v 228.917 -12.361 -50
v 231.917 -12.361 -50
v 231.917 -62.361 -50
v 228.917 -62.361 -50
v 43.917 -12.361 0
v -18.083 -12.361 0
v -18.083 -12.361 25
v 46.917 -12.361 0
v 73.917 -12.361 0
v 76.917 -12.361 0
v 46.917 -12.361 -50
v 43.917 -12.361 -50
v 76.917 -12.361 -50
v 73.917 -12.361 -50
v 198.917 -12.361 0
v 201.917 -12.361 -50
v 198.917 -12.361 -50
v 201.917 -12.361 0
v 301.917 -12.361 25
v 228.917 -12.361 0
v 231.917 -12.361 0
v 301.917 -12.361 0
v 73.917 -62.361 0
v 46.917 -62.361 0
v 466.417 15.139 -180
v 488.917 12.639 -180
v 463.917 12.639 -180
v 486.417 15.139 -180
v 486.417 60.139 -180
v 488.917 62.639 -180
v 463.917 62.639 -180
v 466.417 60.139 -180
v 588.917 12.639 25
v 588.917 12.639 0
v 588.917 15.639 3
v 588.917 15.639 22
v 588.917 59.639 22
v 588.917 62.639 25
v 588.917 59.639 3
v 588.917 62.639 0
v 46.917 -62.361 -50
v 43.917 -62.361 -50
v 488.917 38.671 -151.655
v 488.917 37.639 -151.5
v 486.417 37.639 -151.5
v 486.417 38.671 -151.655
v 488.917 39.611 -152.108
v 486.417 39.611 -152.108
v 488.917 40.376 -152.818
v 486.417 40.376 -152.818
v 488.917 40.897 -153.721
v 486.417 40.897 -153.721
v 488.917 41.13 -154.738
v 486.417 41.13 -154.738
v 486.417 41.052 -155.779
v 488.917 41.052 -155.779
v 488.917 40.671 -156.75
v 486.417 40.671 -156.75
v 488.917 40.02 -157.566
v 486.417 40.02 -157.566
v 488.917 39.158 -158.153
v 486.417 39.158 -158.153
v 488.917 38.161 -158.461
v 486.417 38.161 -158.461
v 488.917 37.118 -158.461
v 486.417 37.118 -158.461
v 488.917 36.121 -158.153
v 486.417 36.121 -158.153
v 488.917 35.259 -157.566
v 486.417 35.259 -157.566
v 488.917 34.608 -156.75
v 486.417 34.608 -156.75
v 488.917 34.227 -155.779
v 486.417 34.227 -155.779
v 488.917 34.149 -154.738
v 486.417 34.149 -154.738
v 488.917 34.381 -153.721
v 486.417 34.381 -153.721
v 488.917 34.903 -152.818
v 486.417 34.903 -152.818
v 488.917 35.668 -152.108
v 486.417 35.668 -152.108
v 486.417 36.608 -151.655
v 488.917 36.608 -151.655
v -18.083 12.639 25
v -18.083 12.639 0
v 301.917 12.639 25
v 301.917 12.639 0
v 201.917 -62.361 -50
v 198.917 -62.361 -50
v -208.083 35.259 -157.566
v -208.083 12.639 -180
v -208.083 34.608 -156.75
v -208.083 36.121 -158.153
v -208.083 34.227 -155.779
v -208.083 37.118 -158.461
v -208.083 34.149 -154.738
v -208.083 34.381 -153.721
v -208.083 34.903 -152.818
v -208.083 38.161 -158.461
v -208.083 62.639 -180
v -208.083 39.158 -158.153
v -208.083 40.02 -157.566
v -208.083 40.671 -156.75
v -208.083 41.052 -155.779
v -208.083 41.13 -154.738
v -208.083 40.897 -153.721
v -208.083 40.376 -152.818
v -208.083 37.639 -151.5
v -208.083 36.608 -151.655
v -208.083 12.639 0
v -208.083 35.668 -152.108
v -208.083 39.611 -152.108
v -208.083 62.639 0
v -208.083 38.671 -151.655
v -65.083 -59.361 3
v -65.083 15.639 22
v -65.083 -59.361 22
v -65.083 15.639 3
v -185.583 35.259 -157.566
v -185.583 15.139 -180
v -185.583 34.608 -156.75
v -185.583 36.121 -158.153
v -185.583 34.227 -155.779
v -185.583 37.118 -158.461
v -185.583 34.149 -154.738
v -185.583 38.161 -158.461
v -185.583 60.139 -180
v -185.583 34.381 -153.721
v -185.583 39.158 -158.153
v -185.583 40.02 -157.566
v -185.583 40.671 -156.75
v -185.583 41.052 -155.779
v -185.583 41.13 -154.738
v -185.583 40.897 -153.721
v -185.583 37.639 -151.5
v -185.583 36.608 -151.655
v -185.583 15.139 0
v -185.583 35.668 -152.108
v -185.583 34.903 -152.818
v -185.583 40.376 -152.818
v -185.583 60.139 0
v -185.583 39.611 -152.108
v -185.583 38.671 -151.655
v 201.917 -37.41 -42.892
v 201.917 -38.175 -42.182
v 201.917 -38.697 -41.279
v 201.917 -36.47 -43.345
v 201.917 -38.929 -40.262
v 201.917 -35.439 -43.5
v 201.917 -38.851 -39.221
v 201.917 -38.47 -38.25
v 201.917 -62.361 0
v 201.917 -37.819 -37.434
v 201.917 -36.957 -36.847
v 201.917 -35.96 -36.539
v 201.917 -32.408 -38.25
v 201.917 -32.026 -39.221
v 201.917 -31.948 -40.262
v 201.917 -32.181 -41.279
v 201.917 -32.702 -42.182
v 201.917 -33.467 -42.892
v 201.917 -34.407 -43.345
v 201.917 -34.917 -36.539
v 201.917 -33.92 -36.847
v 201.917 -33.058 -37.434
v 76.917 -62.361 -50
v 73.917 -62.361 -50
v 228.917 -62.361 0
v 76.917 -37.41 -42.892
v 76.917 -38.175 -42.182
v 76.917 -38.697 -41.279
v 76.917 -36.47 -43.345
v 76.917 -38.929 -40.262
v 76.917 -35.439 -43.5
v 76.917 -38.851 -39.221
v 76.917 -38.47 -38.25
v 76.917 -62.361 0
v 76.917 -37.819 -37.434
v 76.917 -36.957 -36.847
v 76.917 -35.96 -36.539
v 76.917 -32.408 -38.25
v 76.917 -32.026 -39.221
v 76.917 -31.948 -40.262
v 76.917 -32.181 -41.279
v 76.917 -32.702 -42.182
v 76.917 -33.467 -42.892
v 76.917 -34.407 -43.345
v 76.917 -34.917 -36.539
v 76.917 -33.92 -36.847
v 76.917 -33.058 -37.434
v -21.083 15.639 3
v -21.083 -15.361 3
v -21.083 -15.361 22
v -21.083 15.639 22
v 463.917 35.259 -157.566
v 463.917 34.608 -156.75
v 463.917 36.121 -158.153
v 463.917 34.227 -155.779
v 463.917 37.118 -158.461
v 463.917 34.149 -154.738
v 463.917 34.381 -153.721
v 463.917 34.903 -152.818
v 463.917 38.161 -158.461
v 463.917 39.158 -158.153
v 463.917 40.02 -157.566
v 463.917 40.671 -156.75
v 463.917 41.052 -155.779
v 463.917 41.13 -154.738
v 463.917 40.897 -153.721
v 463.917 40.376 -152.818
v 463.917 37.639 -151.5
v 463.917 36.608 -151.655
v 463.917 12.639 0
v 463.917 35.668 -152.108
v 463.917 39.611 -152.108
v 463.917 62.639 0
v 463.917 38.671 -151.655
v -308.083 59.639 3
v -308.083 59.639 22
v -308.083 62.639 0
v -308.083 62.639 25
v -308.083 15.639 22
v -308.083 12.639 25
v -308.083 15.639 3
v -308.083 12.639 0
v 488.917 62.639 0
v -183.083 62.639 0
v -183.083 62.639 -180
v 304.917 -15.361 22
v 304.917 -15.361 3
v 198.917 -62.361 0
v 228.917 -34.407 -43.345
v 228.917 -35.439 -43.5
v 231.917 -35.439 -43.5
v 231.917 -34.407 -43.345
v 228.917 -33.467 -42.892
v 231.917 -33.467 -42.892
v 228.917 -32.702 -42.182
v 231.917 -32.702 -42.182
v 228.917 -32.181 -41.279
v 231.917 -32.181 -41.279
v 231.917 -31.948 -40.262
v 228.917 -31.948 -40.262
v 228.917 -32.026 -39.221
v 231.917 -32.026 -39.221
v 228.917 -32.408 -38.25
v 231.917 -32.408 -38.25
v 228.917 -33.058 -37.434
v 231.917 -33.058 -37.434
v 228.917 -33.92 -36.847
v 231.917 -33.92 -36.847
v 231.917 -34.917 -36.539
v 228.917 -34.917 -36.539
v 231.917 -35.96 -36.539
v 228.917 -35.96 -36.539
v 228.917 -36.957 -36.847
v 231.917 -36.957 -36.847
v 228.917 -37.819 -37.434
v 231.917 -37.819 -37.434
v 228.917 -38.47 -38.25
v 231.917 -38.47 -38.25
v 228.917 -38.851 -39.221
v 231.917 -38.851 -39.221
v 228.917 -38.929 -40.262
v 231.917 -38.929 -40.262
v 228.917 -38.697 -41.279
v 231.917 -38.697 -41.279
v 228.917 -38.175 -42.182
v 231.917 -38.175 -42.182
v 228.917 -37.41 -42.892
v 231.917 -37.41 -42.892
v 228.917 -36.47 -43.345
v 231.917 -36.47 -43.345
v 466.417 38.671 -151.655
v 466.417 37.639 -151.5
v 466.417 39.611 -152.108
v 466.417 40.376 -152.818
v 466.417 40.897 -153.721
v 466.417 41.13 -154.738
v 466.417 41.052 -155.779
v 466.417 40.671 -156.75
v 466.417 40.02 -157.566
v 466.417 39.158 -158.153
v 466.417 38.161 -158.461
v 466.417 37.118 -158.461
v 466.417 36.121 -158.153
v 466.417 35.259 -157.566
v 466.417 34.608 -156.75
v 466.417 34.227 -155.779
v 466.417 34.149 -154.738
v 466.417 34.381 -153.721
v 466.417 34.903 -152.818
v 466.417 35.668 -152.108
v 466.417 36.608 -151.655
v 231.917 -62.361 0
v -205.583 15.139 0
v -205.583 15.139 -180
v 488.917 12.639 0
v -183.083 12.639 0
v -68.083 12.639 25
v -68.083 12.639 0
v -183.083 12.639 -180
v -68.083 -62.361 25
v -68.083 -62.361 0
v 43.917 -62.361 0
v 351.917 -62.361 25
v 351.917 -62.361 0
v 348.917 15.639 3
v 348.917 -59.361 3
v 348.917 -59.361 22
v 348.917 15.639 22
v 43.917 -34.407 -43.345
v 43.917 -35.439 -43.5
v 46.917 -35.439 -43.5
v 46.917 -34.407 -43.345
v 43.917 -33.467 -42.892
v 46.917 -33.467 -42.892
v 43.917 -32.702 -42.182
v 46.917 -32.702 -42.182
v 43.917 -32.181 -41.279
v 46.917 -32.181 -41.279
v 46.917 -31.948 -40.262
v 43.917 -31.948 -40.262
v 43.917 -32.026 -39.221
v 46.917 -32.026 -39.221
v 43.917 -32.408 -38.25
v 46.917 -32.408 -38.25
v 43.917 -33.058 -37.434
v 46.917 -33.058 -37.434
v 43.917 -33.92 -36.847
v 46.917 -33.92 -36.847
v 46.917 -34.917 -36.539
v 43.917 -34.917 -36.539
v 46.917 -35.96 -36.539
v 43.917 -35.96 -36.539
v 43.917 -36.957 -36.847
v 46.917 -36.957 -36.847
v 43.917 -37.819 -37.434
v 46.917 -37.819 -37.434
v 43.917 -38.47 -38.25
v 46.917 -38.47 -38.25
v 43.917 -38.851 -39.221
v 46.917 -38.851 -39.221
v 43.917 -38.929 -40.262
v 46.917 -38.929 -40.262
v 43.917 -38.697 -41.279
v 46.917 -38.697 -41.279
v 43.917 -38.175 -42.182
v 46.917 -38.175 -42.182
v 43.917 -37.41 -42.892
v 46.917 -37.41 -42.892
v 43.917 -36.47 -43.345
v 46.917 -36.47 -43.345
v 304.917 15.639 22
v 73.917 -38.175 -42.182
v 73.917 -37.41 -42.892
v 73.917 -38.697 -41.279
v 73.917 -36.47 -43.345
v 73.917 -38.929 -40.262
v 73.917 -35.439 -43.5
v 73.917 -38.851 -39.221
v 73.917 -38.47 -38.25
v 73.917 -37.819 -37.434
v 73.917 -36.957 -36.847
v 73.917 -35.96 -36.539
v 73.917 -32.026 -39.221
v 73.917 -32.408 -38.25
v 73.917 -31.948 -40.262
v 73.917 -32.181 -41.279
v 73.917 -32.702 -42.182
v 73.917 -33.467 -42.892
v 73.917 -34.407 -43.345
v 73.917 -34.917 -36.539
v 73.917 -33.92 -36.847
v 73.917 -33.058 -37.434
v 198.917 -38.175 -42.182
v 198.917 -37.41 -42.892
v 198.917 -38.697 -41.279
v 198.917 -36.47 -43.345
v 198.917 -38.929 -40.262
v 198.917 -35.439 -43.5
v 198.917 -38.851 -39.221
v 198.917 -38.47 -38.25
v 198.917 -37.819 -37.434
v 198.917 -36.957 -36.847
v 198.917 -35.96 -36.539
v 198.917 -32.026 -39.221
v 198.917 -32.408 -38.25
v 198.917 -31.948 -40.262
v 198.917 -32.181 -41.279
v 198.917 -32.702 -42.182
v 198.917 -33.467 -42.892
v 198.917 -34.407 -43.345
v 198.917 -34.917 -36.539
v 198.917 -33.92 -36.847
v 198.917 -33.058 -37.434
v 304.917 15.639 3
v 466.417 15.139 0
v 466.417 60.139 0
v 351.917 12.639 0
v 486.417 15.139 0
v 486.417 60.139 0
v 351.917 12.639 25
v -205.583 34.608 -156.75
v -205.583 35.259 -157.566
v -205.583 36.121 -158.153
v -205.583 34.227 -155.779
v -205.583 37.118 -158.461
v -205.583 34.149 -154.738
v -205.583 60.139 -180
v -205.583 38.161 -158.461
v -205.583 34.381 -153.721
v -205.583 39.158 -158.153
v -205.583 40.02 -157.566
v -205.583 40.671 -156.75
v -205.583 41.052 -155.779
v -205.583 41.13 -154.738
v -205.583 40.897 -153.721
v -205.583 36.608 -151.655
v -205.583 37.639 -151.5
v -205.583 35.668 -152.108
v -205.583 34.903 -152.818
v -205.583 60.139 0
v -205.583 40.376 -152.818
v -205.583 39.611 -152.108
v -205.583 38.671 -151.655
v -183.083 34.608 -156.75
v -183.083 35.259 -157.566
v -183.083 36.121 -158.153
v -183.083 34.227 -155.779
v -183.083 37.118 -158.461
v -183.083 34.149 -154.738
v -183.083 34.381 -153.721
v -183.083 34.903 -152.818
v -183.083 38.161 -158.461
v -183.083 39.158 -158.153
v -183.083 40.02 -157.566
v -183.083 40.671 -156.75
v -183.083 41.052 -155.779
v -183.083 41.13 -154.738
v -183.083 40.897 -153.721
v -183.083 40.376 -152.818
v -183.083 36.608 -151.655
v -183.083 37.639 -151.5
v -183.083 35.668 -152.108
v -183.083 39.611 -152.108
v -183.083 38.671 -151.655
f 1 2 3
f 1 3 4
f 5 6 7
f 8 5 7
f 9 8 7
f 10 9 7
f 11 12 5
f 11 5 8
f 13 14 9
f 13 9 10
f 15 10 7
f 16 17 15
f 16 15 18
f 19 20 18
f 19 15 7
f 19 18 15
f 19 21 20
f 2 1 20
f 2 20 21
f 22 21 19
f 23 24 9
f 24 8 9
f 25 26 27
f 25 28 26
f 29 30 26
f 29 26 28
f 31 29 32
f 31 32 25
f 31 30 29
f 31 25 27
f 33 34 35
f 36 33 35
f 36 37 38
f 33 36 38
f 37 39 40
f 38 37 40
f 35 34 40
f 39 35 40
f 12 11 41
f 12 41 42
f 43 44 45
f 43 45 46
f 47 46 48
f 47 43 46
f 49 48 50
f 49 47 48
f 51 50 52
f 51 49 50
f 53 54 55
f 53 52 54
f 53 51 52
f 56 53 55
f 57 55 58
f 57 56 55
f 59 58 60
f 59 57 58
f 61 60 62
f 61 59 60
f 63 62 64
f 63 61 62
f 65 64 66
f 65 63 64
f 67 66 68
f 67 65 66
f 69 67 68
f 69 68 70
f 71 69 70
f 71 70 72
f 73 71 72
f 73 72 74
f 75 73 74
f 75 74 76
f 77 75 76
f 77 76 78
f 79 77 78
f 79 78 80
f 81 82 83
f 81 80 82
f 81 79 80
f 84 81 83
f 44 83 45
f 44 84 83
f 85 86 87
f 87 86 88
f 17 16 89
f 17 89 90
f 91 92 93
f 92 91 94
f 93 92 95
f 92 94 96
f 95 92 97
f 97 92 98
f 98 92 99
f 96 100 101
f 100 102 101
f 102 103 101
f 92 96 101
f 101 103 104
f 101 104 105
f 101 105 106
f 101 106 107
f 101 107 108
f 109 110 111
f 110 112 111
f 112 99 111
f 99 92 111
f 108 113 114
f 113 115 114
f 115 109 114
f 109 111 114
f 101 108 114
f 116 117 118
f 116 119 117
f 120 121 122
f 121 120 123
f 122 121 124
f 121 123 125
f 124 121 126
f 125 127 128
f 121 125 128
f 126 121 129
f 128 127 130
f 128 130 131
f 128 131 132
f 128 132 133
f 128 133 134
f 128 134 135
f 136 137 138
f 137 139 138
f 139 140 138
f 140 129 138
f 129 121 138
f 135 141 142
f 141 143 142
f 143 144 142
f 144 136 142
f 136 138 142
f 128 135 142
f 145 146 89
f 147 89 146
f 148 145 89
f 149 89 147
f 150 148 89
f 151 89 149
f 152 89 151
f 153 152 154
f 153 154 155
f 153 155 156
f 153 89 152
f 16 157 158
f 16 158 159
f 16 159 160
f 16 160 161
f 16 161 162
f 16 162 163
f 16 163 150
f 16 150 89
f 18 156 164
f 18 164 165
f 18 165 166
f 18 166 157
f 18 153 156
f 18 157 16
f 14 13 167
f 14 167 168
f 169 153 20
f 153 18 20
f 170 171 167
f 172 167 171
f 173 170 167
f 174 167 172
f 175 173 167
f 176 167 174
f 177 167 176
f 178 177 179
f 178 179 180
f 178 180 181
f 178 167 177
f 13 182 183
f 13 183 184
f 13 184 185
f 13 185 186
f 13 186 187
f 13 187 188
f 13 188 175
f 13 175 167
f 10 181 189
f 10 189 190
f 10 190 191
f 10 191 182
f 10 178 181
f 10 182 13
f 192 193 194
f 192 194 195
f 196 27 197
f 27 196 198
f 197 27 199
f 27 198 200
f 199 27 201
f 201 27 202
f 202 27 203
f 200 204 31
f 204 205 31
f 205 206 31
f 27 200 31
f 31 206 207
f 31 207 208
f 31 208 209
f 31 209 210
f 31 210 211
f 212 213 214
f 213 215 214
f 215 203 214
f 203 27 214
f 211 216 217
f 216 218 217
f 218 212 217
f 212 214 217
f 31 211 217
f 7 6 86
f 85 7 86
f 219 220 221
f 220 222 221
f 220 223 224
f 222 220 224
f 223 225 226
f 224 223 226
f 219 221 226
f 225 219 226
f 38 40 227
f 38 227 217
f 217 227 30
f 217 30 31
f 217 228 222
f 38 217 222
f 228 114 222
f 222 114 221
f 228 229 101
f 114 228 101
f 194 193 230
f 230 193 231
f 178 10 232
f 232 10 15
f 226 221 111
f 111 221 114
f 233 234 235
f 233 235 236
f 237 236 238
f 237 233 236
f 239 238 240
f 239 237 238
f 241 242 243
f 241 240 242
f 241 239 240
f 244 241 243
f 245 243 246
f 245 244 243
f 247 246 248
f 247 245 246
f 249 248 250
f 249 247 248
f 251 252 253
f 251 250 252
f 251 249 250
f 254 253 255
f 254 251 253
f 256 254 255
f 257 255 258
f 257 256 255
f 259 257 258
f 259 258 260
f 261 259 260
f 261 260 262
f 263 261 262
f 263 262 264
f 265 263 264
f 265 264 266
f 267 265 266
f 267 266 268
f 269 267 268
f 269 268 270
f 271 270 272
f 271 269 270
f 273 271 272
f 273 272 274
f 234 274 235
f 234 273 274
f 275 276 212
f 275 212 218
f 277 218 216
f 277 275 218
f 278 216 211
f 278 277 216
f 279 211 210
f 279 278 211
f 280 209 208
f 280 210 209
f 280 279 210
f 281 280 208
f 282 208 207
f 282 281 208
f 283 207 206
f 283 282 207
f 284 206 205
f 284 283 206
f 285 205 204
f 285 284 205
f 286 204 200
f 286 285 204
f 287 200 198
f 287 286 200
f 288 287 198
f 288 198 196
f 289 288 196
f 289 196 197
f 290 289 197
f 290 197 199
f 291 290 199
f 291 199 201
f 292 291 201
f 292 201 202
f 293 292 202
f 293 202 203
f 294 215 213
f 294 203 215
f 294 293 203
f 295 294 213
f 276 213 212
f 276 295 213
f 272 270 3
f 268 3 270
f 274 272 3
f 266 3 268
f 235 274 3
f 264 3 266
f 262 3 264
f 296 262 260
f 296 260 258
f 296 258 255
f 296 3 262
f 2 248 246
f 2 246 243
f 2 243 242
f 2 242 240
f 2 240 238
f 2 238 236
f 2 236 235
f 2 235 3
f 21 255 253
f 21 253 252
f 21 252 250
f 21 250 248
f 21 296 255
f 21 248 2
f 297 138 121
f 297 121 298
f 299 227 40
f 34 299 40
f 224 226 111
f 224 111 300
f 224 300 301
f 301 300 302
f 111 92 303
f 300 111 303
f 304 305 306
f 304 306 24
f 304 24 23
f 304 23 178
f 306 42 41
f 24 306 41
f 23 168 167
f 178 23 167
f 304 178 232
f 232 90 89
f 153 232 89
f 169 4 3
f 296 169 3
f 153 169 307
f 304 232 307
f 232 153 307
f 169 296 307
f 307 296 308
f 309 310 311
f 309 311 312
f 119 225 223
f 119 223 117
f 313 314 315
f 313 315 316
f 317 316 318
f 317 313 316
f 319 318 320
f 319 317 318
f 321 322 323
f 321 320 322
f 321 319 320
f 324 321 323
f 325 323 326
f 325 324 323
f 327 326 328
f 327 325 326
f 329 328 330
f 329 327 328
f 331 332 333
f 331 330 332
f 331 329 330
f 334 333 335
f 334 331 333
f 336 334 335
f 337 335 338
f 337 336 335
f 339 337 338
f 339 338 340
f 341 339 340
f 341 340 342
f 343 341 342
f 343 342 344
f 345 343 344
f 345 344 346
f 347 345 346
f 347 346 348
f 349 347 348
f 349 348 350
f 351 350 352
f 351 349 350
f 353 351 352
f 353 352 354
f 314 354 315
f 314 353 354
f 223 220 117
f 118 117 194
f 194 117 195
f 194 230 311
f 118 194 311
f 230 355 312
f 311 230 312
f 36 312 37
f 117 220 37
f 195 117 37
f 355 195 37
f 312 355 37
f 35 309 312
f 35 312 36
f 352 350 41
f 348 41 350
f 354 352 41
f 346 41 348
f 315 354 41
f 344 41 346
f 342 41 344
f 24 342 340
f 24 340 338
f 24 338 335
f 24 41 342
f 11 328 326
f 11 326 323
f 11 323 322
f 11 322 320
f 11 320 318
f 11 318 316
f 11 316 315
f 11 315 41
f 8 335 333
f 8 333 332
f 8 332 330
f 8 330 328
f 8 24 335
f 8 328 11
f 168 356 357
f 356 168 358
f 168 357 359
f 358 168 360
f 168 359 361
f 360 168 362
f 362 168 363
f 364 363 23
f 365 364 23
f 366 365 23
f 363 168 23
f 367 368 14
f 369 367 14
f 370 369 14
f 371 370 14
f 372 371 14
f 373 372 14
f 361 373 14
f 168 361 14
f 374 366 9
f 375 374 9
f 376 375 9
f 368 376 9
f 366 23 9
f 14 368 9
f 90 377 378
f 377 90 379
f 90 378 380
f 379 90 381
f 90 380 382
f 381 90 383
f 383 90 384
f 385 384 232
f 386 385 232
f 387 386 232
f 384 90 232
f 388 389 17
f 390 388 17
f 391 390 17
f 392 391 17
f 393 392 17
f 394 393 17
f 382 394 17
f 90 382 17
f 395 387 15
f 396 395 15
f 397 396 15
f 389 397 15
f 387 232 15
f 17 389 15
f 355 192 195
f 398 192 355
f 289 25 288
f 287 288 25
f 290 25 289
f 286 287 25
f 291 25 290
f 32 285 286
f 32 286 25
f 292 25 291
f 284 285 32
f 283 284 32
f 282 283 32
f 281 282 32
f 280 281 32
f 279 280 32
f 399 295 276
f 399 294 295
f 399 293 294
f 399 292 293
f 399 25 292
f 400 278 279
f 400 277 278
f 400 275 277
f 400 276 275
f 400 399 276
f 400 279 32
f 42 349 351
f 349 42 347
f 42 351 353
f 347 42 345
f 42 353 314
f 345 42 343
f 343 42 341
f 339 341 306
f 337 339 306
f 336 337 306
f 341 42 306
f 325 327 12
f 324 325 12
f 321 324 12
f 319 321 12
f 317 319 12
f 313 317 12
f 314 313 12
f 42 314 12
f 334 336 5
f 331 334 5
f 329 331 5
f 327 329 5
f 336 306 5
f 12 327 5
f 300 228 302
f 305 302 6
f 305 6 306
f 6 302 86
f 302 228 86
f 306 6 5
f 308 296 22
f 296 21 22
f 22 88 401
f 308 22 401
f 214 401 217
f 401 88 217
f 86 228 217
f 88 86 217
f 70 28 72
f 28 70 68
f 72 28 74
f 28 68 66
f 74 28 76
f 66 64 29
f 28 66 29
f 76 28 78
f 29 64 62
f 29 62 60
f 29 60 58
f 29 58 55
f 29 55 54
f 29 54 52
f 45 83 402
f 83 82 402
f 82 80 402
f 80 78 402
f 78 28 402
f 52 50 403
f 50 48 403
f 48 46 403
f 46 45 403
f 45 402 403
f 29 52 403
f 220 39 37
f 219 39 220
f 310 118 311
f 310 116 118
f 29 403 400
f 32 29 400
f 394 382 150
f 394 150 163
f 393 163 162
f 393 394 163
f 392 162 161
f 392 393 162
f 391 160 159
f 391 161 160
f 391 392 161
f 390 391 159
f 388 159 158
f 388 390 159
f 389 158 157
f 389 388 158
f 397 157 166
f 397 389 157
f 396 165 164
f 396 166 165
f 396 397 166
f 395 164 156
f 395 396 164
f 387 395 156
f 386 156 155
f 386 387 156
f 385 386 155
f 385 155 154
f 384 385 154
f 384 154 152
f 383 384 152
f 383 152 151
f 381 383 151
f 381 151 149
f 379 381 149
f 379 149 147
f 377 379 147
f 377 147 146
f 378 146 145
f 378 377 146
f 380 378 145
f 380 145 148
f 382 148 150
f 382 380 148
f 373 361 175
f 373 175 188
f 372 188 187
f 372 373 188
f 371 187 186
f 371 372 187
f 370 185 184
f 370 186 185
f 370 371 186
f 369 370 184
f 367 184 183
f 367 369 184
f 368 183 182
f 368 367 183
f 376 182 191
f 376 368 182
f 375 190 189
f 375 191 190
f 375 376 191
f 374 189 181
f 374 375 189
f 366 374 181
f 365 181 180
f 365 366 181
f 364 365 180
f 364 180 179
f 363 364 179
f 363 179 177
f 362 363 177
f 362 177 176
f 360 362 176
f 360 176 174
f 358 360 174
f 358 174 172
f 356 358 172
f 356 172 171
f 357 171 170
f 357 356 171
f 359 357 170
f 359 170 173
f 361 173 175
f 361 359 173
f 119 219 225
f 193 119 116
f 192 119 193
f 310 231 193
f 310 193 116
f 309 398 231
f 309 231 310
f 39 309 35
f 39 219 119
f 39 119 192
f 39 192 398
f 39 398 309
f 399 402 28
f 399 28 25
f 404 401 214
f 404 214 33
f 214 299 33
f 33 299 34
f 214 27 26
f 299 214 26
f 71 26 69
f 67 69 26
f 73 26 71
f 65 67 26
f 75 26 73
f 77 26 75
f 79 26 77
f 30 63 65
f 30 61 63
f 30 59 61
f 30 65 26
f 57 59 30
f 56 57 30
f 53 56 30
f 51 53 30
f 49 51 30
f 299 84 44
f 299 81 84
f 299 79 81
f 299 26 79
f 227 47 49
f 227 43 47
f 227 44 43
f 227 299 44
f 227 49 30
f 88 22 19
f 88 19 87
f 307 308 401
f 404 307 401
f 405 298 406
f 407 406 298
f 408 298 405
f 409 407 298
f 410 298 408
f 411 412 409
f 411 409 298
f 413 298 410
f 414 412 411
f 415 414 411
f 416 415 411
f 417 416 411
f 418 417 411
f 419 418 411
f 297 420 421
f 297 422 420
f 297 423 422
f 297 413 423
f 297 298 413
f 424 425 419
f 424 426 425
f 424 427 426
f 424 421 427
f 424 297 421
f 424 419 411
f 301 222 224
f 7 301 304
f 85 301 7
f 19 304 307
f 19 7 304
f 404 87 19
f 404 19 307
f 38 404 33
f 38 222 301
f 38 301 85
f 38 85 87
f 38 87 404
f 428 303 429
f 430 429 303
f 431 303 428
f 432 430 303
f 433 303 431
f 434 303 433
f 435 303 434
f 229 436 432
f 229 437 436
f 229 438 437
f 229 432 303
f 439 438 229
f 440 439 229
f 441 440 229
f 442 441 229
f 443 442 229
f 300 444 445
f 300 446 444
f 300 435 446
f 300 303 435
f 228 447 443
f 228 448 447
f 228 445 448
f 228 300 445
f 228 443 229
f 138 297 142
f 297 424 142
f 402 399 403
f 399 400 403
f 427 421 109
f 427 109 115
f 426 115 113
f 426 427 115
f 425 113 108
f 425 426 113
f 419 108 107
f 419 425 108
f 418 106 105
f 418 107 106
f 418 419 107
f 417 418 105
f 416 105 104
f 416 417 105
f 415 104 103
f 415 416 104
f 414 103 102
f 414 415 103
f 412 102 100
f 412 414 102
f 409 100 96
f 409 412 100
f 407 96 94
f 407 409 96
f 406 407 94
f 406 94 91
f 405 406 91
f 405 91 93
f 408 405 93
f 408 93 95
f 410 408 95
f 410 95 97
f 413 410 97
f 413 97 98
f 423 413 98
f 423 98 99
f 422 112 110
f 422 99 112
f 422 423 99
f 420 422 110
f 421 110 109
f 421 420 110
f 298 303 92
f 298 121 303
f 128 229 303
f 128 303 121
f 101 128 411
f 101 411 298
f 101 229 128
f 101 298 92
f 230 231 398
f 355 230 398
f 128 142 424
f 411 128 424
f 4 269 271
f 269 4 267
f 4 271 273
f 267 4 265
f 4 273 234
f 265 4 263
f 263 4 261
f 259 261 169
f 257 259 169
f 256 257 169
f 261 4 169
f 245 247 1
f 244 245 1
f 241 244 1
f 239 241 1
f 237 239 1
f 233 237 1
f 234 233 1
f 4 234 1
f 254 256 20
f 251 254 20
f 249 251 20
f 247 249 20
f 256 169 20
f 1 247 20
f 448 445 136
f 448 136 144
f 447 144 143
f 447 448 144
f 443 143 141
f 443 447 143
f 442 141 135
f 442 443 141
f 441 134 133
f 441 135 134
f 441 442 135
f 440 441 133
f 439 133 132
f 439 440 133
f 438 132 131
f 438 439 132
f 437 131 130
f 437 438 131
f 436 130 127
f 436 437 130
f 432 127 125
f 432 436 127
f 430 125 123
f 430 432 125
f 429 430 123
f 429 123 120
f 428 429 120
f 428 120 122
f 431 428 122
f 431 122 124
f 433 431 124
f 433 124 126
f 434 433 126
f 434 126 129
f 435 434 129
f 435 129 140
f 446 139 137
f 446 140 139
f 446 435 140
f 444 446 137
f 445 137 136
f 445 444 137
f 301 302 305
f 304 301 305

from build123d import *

# Parameters (mm, degrees)
SKETCH1_W               = 320
SKETCH1_H               = 25
BOSS_EXTRUDE1_DEPTH     = 25
SHELL1_T                = -3
SKETCH5_W               = 3
SKETCH5_H               = 50
BOSS_EXTRUDE3_DEPTH     = 50
CUT_EXTRUDE1_DEPTH      = 546.915466805
CUT_EXTRUDE1_DEPTH_BACK = 546.915466805
SKETCH6_R               = 3.5
SKETCH7_W               = 25
SKETCH7_H               = 50
SKETCH7_W_2             = 20
SKETCH7_H_2             = 45
EXTRUDE_THIN1_DEPTH     = 180
CUT_EXTRUDE2_DEPTH      = 820.470986001
CUT_EXTRUDE2_DEPTH_BACK = 820.470986001
SKETCH8_R               = 3.5


with BuildPart() as part:
    # Sketch1 → Boss-Extrude1 (new body)
    with BuildSketch(Plane.XY):
        Polygon((351.917253095, 12.639419675), (588.917253095, 12.639419675), (588.917253095, 62.639419675), (-308.082746905, 62.639419675), (-308.082746905, 12.639419675), (-68.082746905, 12.639419675), (-68.082746905, -62.360580325), (351.917253095, -62.360580325), align=None)
        with Locations((141.917253095, 0.139419675)):
            Rectangle(SKETCH1_W, SKETCH1_H, mode=Mode.SUBTRACT)
    extrude(amount=BOSS_EXTRUDE1_DEPTH)

    # Shell1
    shell1_openings = [part.faces().sort_by_distance(p)[0] for p in [
        (-308.082746905, 37.639419675, 12.5),
        (588.917253095, 37.639419675, 12.5),
    ]]
    offset(amount=SHELL1_T, openings=shell1_openings, kind=Kind.INTERSECTION)

    # Sketch5 → Boss-Extrude3 (add)
    with BuildSketch(Plane(origin=(0, 0, 0), x_dir=(-1, 0, 0), z_dir=(0, 0, -1))):
        with Locations((-230.417253095, -37.360580325)):
            Rectangle(SKETCH5_W, SKETCH5_H)
        with Locations((-200.417253095, -37.360580325)):
            Rectangle(SKETCH5_W, SKETCH5_H)
        with Locations((-75.417253095, -37.360580325)):
            Rectangle(SKETCH5_W, SKETCH5_H)
        with Locations((-45.417253095, -37.360580325)):
            Rectangle(SKETCH5_W, SKETCH5_H)
    extrude(amount=BOSS_EXTRUDE3_DEPTH)

    # Sketch6 → Cut-Extrude1 (cut, two sides: drawn at the far end of the back side and taken through both)
    with BuildSketch(Plane(origin=(231.917253095, 0, 0), x_dir=(0, 0, -1), z_dir=(1, 0, 0)).offset(-CUT_EXTRUDE1_DEPTH_BACK)):
        with Locations((40, -35.438653819)):
            Circle(SKETCH6_R)
    extrude(amount=CUT_EXTRUDE1_DEPTH + CUT_EXTRUDE1_DEPTH_BACK, mode=Mode.SUBTRACT)

    # Sketch7 → Extrude-Thin1 (add)
    # profile 1 of 2: a face of its own
    with BuildSketch(Plane(origin=(0, 0, 0), x_dir=(-1, 0, 0), z_dir=(0, 0, -1))):
        with Locations((-476.417253095, 37.639419675)):
            Rectangle(SKETCH7_W, SKETCH7_H)
        with Locations((-476.417253095, 37.639419675)):
            Rectangle(SKETCH7_W_2, SKETCH7_H_2, mode=Mode.SUBTRACT)
    # profile 2 of 2: a face of its own
    with BuildSketch(Plane(origin=(0, 0, 0), x_dir=(-1, 0, 0), z_dir=(0, 0, -1))):
        with Locations((195.582746905, 37.639419675)):
            Rectangle(SKETCH7_W, SKETCH7_H)
        with Locations((195.582746905, 37.639419675)):
            Rectangle(SKETCH7_W_2, SKETCH7_H_2, mode=Mode.SUBTRACT)
    extrude(amount=EXTRUDE_THIN1_DEPTH)

    # Sketch8 → Cut-Extrude2 (cut, two sides: drawn at the far end of the back side and taken through both)
    with BuildSketch(Plane.ZY.offset(208.082746905).offset(-CUT_EXTRUDE2_DEPTH_BACK)):
        with Locations((-155, 37.639419675)):
            Circle(SKETCH8_R)
    extrude(amount=CUT_EXTRUDE2_DEPTH + CUT_EXTRUDE2_DEPTH_BACK, mode=Mode.SUBTRACT)


solid = part.part
